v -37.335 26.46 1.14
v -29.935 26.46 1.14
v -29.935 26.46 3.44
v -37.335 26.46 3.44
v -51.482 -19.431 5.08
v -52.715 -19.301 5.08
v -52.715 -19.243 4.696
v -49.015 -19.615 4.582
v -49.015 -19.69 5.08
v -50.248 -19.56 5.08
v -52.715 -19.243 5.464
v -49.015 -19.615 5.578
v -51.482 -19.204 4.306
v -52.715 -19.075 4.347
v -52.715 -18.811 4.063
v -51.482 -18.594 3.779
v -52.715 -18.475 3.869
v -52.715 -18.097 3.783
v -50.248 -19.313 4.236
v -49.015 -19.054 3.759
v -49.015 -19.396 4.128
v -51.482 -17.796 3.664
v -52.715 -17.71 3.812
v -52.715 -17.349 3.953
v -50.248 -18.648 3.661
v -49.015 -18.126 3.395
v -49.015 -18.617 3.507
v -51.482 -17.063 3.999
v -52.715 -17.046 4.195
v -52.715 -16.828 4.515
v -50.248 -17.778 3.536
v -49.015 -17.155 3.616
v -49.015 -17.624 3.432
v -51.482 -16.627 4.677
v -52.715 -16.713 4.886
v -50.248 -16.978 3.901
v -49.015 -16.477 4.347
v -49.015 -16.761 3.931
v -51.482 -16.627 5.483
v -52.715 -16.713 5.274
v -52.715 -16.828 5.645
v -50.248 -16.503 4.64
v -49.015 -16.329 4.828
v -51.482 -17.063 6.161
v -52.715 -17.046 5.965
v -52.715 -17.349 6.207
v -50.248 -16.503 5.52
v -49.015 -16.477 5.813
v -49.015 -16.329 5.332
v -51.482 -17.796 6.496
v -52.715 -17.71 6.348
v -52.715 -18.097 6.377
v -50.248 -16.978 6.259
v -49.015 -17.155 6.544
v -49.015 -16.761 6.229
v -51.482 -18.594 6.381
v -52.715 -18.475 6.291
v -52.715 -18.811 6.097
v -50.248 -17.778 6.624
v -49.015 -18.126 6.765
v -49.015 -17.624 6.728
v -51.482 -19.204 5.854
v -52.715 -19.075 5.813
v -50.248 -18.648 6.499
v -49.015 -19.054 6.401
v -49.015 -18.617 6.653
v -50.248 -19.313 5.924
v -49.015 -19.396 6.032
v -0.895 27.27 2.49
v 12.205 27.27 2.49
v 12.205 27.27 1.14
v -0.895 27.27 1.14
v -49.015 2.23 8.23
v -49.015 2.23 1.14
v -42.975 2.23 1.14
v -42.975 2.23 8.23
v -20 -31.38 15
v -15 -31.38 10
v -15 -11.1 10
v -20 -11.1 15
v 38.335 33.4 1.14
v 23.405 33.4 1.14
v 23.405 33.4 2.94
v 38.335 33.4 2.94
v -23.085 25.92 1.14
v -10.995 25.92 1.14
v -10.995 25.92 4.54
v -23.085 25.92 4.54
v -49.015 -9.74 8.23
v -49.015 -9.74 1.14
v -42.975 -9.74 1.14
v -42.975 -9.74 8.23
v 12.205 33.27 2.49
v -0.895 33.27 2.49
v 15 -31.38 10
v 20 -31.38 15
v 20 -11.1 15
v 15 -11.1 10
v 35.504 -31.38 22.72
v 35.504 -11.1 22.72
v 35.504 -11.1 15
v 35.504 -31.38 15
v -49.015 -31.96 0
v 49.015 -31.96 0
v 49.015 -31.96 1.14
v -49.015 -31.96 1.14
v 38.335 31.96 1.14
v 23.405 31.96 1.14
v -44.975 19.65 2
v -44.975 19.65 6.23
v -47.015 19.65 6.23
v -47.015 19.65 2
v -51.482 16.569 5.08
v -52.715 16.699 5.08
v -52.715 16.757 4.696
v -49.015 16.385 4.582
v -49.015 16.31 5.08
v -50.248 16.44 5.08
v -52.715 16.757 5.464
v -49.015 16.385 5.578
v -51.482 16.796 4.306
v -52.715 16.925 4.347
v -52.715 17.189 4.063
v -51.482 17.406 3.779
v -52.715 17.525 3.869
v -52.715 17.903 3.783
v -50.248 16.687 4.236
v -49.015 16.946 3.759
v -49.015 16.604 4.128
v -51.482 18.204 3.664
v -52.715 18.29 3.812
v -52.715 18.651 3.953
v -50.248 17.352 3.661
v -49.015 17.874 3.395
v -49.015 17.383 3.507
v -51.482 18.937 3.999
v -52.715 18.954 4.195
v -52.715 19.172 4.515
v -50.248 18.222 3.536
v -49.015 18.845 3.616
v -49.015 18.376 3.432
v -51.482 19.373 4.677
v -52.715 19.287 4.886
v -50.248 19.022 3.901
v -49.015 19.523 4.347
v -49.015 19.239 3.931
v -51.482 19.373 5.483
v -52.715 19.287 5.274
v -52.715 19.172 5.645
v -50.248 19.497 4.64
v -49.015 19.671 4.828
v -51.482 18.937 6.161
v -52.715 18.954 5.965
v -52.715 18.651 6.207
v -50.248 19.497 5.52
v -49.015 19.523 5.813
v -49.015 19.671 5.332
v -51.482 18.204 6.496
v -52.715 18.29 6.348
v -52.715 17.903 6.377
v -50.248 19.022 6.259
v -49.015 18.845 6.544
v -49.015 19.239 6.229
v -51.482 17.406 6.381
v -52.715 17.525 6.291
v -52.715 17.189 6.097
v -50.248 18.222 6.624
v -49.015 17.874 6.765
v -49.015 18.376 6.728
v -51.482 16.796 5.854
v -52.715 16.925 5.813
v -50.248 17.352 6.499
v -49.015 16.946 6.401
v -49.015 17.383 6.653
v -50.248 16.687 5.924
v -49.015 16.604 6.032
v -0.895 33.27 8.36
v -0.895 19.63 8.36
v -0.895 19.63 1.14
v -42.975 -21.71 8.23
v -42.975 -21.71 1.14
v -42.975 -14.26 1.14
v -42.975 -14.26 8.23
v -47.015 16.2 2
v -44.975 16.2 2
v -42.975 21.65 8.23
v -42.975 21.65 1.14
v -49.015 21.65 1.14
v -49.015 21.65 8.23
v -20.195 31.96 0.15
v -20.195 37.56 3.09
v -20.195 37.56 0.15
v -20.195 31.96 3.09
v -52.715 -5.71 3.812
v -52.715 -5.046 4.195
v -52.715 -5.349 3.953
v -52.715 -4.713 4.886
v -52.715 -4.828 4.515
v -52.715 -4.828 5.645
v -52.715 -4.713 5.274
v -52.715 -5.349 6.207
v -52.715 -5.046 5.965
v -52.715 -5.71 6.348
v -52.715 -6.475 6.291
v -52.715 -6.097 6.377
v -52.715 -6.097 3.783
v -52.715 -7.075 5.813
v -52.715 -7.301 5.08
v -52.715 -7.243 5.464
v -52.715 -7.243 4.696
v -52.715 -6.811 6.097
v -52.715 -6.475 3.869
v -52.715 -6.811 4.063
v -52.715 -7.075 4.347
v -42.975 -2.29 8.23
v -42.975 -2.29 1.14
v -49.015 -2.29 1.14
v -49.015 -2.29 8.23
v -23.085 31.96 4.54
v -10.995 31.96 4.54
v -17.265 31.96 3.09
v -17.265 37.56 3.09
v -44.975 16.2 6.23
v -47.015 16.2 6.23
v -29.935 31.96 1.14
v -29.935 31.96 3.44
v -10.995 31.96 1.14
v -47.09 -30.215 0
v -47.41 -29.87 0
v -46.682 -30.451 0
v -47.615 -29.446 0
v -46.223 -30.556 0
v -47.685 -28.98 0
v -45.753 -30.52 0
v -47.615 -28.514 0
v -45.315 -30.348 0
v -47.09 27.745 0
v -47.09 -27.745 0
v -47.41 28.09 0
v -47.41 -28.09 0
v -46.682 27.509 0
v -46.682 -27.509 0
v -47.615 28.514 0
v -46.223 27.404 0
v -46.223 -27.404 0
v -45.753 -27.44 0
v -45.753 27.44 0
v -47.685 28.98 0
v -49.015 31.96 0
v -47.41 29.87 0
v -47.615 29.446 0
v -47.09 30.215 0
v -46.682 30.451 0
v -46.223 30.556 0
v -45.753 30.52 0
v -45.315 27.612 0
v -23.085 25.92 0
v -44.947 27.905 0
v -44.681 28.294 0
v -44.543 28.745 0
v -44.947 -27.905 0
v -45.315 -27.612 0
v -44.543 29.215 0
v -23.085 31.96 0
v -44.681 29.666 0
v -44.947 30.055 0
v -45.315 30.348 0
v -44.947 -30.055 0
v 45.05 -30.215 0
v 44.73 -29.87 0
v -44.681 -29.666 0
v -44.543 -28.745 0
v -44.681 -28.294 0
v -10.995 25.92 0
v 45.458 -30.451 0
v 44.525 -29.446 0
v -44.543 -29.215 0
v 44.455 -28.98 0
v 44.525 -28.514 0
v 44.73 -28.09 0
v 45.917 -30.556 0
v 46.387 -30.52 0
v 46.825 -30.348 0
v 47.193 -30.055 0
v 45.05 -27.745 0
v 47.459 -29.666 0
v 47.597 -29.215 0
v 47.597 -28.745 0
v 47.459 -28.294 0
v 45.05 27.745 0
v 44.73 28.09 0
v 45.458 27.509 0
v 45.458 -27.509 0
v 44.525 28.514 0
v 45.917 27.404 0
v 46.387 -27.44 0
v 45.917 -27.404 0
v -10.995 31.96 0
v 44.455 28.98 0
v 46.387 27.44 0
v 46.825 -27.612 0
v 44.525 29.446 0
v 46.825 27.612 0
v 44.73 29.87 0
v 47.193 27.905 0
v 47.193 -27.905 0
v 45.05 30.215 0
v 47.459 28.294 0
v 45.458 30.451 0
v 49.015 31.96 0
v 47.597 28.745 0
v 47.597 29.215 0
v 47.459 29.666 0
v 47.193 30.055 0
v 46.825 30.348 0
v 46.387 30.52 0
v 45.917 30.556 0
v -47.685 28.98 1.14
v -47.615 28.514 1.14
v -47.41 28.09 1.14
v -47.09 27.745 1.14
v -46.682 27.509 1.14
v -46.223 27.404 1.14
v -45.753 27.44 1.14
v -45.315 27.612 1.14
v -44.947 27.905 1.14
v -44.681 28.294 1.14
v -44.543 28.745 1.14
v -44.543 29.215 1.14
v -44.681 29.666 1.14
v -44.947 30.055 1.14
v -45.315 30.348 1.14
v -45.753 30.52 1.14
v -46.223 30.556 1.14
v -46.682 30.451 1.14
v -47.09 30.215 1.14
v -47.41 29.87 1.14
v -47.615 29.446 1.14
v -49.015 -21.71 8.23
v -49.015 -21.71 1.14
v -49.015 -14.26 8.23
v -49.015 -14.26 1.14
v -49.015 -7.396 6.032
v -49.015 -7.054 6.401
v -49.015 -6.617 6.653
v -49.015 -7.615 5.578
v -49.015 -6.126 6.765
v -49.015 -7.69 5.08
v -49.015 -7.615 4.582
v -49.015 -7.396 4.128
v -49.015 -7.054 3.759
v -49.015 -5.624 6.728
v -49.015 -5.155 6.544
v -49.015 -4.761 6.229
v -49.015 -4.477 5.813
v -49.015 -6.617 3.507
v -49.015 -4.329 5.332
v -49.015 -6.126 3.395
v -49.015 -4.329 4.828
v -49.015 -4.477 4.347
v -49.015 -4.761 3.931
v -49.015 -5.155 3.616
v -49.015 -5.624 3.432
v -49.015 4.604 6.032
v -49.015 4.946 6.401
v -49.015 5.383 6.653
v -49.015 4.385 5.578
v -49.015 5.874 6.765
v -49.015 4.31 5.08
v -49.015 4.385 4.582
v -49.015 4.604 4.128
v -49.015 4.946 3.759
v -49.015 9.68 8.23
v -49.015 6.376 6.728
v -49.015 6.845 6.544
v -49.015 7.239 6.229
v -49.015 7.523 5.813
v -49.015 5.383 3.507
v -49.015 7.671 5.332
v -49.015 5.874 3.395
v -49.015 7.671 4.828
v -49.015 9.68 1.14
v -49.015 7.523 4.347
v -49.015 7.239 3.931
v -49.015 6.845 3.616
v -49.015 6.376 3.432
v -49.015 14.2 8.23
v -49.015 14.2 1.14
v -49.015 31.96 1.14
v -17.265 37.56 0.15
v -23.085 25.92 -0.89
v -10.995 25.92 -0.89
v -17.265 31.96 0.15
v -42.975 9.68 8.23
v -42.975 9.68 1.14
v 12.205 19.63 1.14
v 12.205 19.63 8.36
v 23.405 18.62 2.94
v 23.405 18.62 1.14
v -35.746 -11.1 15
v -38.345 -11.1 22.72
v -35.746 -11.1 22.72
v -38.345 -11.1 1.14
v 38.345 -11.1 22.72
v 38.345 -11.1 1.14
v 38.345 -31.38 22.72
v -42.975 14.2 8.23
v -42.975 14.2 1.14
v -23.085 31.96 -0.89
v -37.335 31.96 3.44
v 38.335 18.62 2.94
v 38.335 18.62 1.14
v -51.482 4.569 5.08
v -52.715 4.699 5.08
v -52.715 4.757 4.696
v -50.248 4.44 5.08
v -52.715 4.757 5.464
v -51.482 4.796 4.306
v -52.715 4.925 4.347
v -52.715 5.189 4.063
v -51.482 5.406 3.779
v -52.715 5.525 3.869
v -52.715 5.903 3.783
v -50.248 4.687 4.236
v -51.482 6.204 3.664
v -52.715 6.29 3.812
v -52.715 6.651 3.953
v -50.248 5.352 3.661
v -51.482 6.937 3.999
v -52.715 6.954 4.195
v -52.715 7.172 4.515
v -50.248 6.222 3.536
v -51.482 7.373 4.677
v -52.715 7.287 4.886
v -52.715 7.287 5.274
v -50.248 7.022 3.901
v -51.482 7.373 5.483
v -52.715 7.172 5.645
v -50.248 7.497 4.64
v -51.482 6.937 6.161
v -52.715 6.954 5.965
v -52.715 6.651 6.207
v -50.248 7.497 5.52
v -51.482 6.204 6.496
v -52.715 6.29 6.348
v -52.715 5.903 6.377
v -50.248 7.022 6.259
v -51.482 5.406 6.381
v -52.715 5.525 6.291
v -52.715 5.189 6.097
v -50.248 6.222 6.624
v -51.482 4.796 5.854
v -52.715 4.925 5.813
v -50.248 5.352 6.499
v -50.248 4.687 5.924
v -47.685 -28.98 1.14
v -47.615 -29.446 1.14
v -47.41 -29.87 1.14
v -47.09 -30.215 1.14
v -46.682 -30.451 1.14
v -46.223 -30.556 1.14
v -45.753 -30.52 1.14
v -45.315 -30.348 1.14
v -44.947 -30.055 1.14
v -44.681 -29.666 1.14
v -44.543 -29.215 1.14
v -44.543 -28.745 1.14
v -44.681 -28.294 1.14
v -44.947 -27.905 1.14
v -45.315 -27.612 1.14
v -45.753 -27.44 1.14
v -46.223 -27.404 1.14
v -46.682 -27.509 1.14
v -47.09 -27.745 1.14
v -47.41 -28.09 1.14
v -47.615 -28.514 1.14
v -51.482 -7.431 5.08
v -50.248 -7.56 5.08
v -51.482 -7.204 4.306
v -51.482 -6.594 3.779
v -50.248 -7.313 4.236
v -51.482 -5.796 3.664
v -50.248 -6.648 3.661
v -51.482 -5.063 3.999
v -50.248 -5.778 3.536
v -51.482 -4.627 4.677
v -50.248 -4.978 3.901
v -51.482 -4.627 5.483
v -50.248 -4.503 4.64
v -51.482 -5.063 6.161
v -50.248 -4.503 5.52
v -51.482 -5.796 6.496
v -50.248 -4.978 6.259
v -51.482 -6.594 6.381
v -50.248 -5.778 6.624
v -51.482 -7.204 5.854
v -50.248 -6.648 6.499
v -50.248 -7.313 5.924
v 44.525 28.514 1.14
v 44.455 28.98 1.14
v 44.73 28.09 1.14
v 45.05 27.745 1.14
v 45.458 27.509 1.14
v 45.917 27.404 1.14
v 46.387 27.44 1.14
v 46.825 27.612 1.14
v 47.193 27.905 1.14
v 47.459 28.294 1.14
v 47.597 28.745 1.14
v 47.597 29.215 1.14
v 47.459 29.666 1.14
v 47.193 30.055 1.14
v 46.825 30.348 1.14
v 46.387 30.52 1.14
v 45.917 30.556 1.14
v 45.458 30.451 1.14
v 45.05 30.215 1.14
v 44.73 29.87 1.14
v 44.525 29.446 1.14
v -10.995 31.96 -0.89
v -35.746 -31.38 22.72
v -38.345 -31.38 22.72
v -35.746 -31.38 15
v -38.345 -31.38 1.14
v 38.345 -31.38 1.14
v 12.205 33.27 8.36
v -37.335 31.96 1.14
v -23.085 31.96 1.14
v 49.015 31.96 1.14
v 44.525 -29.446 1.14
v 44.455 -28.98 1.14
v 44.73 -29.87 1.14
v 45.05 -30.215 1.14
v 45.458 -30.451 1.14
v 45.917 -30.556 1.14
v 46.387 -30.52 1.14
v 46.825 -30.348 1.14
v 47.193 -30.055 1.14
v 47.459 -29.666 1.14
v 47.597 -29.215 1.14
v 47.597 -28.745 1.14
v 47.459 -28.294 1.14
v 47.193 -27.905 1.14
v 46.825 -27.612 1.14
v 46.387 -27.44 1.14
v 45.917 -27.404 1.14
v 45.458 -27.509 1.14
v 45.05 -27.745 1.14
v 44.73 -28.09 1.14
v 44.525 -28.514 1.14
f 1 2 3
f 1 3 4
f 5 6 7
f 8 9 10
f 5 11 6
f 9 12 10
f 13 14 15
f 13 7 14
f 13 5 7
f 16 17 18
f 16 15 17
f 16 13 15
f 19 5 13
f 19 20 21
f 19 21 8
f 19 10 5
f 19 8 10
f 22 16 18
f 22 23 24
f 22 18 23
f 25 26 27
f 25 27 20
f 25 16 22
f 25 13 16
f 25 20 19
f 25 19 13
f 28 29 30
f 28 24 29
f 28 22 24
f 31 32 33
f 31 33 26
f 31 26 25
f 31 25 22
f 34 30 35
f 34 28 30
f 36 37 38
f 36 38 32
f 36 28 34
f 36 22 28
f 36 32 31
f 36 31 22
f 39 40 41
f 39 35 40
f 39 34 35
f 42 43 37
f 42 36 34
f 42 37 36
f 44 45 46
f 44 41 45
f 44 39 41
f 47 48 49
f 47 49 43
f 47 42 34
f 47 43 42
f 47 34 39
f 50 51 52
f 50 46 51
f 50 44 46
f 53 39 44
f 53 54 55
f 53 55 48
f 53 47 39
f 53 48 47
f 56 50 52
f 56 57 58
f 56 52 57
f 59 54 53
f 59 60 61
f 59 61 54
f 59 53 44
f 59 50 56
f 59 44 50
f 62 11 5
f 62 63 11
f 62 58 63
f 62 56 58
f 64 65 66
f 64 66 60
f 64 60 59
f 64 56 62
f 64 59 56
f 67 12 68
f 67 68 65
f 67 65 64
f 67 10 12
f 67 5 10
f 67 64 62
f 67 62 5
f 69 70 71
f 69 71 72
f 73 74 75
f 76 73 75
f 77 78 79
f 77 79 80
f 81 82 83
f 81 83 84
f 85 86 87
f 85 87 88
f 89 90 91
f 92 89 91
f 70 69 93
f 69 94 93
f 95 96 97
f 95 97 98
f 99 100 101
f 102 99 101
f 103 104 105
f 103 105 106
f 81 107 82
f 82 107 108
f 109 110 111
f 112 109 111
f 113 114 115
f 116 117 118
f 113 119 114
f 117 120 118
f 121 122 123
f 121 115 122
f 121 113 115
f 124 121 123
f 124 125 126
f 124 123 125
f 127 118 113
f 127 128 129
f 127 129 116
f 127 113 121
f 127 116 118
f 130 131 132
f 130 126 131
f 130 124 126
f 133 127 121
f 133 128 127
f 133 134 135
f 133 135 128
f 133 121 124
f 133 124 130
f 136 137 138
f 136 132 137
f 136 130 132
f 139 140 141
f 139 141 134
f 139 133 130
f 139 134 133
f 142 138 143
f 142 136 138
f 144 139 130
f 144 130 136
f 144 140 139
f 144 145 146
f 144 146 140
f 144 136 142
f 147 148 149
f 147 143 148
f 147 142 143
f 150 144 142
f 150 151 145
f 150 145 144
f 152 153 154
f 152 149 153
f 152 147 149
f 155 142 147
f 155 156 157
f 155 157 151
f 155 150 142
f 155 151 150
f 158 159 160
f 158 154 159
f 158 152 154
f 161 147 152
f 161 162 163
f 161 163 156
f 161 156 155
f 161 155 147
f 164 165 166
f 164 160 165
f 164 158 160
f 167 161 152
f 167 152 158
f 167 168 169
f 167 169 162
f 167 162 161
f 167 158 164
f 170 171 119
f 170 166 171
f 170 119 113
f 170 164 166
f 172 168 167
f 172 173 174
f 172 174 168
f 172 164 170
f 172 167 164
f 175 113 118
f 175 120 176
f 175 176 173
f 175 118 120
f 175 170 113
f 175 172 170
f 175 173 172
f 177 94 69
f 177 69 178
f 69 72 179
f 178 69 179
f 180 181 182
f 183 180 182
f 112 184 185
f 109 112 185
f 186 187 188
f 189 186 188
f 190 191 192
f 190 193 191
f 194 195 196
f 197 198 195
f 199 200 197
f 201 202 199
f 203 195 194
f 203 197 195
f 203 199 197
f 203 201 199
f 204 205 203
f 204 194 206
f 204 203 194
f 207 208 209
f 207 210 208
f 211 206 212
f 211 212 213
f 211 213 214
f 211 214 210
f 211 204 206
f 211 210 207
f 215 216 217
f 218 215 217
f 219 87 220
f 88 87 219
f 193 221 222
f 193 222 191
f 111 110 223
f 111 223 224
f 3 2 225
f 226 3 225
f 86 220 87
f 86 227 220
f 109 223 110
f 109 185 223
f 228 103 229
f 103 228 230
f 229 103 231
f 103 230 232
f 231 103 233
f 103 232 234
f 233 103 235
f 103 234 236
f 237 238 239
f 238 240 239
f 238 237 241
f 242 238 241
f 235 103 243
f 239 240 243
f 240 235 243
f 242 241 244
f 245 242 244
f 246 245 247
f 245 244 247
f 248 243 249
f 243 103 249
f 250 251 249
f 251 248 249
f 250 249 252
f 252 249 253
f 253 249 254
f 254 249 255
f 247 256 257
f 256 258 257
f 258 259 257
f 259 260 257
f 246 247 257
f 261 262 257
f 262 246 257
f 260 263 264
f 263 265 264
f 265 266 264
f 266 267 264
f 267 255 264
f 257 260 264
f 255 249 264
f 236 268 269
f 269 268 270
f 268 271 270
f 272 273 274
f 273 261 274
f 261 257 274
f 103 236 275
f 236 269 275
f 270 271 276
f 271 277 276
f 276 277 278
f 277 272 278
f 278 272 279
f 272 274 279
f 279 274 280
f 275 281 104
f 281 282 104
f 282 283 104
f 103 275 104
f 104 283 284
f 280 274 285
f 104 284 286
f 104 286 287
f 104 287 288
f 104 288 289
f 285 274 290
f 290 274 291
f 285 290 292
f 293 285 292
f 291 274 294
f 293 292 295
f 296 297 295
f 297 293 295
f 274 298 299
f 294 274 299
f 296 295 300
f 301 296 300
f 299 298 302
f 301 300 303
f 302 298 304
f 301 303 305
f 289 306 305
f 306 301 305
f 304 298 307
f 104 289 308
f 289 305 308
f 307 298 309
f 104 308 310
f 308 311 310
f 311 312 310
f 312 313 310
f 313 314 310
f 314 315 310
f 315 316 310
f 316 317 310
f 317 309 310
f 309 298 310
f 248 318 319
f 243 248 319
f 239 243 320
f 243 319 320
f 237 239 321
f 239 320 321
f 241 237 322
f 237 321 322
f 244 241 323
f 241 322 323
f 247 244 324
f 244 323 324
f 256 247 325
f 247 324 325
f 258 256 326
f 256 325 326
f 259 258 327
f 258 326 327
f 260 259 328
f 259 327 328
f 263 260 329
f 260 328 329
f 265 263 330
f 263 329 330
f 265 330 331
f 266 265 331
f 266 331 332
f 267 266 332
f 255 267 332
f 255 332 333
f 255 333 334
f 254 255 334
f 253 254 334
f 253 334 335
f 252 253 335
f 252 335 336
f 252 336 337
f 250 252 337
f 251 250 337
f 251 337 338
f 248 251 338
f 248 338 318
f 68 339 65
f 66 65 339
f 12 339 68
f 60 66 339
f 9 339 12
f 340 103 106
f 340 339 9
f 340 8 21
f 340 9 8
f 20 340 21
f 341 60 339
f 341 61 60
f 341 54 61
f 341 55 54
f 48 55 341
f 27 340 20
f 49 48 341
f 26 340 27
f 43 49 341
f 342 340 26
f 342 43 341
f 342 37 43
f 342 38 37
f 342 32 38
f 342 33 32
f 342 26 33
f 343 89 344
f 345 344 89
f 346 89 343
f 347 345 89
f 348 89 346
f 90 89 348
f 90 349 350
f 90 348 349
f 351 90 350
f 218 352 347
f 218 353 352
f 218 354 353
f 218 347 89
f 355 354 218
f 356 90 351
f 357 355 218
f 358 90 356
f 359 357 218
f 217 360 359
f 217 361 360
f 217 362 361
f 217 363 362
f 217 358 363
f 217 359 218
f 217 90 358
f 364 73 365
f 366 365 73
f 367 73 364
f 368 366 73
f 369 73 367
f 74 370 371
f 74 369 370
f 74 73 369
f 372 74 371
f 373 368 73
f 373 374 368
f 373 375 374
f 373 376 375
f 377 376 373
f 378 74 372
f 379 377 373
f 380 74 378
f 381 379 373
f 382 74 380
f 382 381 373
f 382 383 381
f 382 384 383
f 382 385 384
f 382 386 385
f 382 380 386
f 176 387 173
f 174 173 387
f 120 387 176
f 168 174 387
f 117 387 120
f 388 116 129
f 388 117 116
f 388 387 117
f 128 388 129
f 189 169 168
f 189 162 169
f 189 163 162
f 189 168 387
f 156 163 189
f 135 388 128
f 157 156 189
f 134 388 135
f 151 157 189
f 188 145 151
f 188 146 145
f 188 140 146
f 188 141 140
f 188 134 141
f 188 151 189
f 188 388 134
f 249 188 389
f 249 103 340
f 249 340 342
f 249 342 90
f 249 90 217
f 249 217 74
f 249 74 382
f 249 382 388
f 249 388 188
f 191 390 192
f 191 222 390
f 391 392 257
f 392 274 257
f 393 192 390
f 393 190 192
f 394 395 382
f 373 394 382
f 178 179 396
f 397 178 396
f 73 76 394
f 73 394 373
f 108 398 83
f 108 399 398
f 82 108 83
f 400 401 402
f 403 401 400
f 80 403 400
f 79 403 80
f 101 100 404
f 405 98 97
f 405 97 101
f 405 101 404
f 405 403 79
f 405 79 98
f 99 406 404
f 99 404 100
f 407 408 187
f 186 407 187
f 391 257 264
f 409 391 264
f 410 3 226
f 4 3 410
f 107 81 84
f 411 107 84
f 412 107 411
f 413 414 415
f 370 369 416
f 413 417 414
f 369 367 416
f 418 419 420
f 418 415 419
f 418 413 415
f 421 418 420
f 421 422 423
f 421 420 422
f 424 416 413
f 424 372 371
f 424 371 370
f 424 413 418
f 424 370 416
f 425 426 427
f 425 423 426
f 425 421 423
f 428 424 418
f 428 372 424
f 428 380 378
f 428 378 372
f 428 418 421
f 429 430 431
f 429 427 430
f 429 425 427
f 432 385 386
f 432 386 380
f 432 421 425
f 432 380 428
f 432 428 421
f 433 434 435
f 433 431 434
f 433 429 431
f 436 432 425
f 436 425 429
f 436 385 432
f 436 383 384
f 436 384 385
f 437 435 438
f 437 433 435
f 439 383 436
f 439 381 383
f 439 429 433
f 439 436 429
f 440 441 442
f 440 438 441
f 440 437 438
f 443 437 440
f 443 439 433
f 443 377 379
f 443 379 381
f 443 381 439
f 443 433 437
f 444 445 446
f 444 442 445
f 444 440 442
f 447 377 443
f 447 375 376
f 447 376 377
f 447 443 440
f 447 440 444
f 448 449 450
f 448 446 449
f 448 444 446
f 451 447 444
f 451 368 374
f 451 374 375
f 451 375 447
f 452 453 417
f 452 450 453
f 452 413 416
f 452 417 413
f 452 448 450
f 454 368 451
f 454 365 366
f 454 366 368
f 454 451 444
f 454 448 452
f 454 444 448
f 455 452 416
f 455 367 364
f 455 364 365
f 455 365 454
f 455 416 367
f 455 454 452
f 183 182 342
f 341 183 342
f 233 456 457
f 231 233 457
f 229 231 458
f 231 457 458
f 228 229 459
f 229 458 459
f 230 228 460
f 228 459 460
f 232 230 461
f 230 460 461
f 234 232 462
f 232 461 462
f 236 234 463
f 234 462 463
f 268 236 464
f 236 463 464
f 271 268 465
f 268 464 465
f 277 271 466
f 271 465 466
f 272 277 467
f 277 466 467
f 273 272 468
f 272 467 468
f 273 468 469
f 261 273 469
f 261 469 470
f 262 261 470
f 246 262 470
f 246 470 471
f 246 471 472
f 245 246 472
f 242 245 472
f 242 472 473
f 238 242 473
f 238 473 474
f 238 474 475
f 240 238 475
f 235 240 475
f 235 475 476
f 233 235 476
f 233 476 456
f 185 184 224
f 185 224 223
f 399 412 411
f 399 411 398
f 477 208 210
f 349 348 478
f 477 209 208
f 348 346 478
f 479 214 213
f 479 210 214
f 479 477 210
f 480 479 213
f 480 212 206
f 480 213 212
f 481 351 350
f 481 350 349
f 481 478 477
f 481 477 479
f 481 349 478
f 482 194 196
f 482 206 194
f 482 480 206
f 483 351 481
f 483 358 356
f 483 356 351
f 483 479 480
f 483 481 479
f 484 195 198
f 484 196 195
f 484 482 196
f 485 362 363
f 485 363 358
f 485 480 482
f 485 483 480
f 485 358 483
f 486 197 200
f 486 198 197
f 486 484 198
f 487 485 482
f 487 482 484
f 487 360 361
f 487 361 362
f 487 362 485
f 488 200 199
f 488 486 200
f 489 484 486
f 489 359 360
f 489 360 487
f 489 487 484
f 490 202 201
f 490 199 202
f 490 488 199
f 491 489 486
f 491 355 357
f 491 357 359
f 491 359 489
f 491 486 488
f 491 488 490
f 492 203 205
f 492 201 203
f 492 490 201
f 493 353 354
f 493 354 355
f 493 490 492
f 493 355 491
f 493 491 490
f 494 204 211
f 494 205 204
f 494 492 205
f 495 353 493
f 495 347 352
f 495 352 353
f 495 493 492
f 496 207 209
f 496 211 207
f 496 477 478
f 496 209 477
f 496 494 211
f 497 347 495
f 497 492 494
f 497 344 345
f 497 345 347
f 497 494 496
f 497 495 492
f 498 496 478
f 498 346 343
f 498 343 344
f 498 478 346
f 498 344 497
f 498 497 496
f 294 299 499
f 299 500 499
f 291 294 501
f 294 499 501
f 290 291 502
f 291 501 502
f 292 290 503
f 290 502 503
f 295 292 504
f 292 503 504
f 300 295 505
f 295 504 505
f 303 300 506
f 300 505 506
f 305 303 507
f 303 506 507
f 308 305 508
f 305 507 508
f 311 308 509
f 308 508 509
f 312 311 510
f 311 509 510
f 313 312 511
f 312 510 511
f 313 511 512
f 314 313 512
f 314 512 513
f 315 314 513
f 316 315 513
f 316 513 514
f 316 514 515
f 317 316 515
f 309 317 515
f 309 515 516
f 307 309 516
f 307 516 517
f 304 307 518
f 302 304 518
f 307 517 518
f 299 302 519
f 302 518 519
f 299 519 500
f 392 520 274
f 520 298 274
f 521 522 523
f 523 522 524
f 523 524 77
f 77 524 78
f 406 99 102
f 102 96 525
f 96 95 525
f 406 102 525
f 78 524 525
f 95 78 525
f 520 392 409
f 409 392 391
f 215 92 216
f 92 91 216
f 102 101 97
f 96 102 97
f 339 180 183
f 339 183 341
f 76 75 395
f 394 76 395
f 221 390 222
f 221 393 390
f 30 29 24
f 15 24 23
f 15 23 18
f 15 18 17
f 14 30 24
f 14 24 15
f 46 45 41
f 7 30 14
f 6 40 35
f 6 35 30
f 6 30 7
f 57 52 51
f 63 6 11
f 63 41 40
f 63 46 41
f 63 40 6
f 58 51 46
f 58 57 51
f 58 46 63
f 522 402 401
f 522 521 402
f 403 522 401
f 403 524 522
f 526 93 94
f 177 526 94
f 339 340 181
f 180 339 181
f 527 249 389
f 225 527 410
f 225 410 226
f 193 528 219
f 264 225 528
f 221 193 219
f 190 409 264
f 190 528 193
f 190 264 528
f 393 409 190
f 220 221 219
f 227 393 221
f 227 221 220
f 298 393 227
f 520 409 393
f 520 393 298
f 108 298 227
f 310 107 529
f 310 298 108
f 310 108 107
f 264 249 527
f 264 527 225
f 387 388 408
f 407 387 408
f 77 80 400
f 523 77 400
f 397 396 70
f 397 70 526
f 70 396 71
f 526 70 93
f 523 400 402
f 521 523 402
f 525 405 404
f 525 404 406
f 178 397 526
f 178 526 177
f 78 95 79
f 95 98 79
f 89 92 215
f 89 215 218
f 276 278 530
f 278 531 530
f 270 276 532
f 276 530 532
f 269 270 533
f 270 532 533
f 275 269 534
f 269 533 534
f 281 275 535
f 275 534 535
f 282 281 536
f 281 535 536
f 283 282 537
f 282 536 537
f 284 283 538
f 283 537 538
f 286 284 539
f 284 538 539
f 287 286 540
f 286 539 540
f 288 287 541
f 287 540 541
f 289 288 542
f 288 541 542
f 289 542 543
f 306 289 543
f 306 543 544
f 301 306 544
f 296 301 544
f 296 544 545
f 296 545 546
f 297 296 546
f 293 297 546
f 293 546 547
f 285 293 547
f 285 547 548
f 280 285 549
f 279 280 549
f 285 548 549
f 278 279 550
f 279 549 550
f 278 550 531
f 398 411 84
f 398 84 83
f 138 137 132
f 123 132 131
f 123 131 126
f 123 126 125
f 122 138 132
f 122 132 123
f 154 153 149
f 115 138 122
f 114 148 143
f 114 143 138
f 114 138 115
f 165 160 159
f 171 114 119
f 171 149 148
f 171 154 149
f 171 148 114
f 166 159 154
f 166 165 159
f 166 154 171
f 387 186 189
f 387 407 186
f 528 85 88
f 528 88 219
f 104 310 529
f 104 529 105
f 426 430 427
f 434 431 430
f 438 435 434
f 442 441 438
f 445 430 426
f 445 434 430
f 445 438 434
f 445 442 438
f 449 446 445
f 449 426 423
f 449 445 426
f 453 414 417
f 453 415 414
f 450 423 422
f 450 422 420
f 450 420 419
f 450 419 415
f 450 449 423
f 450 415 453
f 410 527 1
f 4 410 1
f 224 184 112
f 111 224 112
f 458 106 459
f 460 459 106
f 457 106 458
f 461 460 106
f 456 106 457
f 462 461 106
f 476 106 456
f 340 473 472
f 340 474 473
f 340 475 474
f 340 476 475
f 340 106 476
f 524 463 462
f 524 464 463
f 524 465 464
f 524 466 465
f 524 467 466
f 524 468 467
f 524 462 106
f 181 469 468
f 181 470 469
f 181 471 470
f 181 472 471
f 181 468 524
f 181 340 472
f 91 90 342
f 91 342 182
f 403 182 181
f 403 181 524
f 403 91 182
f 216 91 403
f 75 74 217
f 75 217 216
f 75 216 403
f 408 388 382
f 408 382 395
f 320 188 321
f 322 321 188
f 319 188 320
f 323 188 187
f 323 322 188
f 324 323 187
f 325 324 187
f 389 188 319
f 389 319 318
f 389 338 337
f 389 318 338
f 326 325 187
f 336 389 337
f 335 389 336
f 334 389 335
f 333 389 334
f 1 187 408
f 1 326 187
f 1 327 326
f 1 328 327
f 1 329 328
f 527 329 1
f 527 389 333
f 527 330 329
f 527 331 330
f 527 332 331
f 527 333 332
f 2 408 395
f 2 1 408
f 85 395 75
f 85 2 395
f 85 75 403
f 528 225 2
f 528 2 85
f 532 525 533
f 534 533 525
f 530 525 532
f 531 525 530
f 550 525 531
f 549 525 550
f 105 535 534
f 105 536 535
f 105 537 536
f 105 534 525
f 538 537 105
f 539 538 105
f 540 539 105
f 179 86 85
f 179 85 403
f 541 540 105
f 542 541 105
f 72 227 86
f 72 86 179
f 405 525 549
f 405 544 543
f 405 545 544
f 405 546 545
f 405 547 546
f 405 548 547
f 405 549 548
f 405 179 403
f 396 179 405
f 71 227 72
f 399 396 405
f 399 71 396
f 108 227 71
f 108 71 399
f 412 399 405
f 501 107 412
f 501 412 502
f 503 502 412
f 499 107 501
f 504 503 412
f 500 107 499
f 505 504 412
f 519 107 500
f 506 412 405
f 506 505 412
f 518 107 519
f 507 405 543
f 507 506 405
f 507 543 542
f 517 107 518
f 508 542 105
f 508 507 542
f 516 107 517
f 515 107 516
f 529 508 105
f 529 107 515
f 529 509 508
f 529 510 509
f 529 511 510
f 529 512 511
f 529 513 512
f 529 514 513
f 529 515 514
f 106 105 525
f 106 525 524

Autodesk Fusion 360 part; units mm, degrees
sketch "Sketch1" plane through (0, 0, 0) normal (0, 0, 1) x (1, 0, 0)
sketch "Sketch2" plane through (0, 0, 0) normal (0, 0, 1) x (1, 0, 0)
  line L0 (49.015, -31.96) -> (-49.015, -31.96)
  line L1 (-49.015, -31.96) -> (-49.015, 31.96)
  line L2 (-49.015, 31.96) -> (49.015, 31.96)
  line L3 (49.015, 31.96) -> (49.015, -31.96)
  line L4 (49.015, -31.96) -> (-49.015, 31.96) construction
  line L5 (-49.015, -31.96) -> (49.015, 31.96) construction
  dimension "d1" = 98.03
  dimension "d2" = 63.92
extrude "Extrude1" add sketch "Sketch2" along normal blind 1.14
sketch "Sketch3" plane through (0, 0, 1.14) normal (0, 0, 1) x (-1, 0, 0)
  line L0 (-49.015, -31.96) -> (49.015, -31.96)
  line L1 (49.015, -31.96) -> (49.015, 31.96)
  line L2 (49.015, 31.96) -> (-49.015, 31.96)
  line L3 (-49.015, 31.96) -> (-49.015, -31.96)
  line L4 (-49.015, 31.96) -> (-38.345, 31.96) construction
  line L5 (49.015, 31.96) -> (38.345, 31.96) construction
  line L6 (38.345, 31.38) -> (38.345, 11.1)
  line L7 (38.345, 11.1) -> (-38.345, 11.1)
  line L8 (-38.345, 11.1) -> (-38.345, 31.38)
  line L9 (38.345, 31.96) -> (-38.345, 31.96)
  circle A0 centre (46.105, -28.98) radius 1.58
  circle A1 centre (46.105, 28.98) radius 1.58
  circle A2 centre (-46.035, -28.98) radius 1.58
  circle A3 centre (-46.035, 28.98) radius 1.58
  line L10 (38.345, 31.38) -> (-38.345, 31.38)
  dimension "d5" = 10.67
  dimension "d6" = 10.67
  dimension "d7" = 2.91
  dimension "d8" = 2.98
  dimension "d9" = 3.16
  dimension "d12" = 3.16
  dimension "d13" = 3.16
  dimension "d14" = 3.16
  dimension "d15" = 2.98
  dimension "d16" = 2.98
  dimension "d17" = 2.98
  dimension "d18" = 2.98
  dimension "d19" = 2.91
  dimension "d20" = 2.98
  dimension "d38" = 20.86
  dimension "d39" = 0.58
extrude "Extrude2" add sketch "Sketch3" along normal blind 21.58 contours L6 L7 L8 L10 | A0 | A1 | A2 | A3
sketch "Sketch5" plane through (0, 0, 1.14) normal (0, 0, 1) x (-1, 0, 0)
  circle A0 centre (46.105, 28.98) radius 1.58
  circle A1 centre (-46.035, -28.98) radius 1.58
  circle A2 centre (46.105, -28.98) radius 1.58
  circle A3 centre (-46.035, 28.98) radius 1.58
  line L0 (-49.015, -31.96) -> (49.015, -31.96)
  line L1 (49.015, -31.96) -> (49.015, 31.96)
  line L2 (49.015, 31.96) -> (-49.015, 31.96)
  line L3 (-49.015, 31.96) -> (-49.015, -31.96)
  line L4 (49.015, 31.96) -> (49.015, 21.71) construction
  line L5 (49.015, 21.71) -> (42.975, 21.71)
  line L6 (42.975, 21.71) -> (42.975, 14.26)
  line L7 (42.975, 14.26) -> (49.015, 14.26)
  line L8 (43.7525, 14.26) -> (43.7525, 9.51) construction
  line L9 (49.015, 9.74) -> (42.975, 9.74)
  line L10 (42.975, 9.74) -> (42.975, 2.29)
  line L11 (42.975, 2.29) -> (49.015, 2.29)
  line L12 (49.015, 2.29) -> (49.015, 9.74)
  line L13 (49.015, 9.74) -> (42.975, 9.74)
  line L14 (43.8683, 2.29) -> (43.8683, -2.46) construction
  line L15 (49.015, -2.23) -> (42.975, -2.23)
  line L16 (42.975, -2.23) -> (42.975, -9.68)
  line L17 (42.975, -9.68) -> (49.015, -9.68)
  line L18 (43.9024, -9.68) -> (43.9024, -14.43) construction
  line L19 (49.015, -14.2) -> (42.975, -14.2)
  line L20 (42.975, -14.2) -> (42.975, -21.65)
  line L21 (42.975, -21.65) -> (49.015, -21.65)
  line L22 (38.345, 11.1) -> (-38.345, 11.1)
  line L23 (-38.345, 11.1) -> (-38.345, 31.38)
  line L24 (-38.345, 31.38) -> (38.345, 31.38)
  line L25 (38.345, 31.38) -> (38.345, 11.1)
  dimension "d21" = 10.25
  dimension "d22" = 6.04
  dimension "d23" = 7.45
  dimension "d24" = 4.75
  dimension "d25" = 7.45
  dimension "d26" = 4.75
  dimension "d27" = 6.04
  dimension "d28" = 7.45
  dimension "d29" = 4.75
  dimension "d30" = 6.04
  dimension "d31" = 7.45
  dimension "d32" = 6.04
  dimension "d33" = 4.52
  dimension "d34" = 4.52
  dimension "d35" = 4.52
extrude "Extrude3" add sketch "Sketch5" along normal blind 7.09 contours L1 L19 L20 L21 | L1 L5 L6 L7 | L1 L15 L16 L17 | L1 L9 L10 L11 L12 L13
extrude "Extrude4" cut 4 faces at (-45.3311, -29.4935, 22.72) (45.7717, -28.3669, 22.72) (45.7717, 29.5931, 22.72) (-45.3311, 28.4665, 22.72) along direction (0, 0, -1) blind 35
sketch "Sketch6" plane through (0, 0, 8.23) normal (0, 0, 1) x (-1, 0, 0)
  line L0 (42.975, 14.26) -> (49.015, 14.26)
  line L1 (49.015, 14.26) -> (49.015, 21.71)
  line L2 (49.015, 21.71) -> (42.975, 21.71)
  line L3 (42.975, 21.71) -> (42.975, 14.26)
  line L4 (49.015, 21.71) -> (46.905, 21.71) construction
  dimension "d42" = 2.11
shell "Shell1" thickness 2 removed faces 1 at (-12.7817, -17.86, 22.72)
sketch "Sketch7" plane through (0, -11.1, 0) normal (0, 1, 0) x (-1, 0, 0)
  line L0 (-38.345, 1.14) -> (38.345, 1.14)
  line L1 (38.345, 1.14) -> (38.345, 22.72)
  line L2 (38.345, 22.72) -> (-38.345, 22.72)
  line L3 (-38.345, 22.72) -> (-38.345, 1.14)
  line L4 (-35.5042, 22.72) -> (-35.5042, 15)
  line L5 (-35.5042, 15) -> (-20, 15)
  line L6 (-20, 15) -> (-15, 10)
  line L7 (-15, 10) -> (15, 10)
  line L8 (15, 10) -> (20, 15)
  line L9 (20, 15) -> (25, 15)
  line L10 (25, 15) -> (35.7465, 15)
  line L11 (35.7465, 15) -> (35.7465, 22.72)
extrude "Extrude5" cut sketch "Sketch7" against normal blind 30 contours L2 L4 L5 L6 L7 L8 L9 L10 L11
sketch "Sketch8" plane through (0, -11.1, 0) normal (0, 1, 0) x (-1, 0, 0)
sketch "Sketch9" plane through (0, 0, 1.14) normal (0, 0, 1) x (-1, 0, 0)
  line L0 (42.975, -14.2) -> (49.015, -14.2)
  line L1 (49.015, -14.2) -> (49.015, -9.68)
  line L2 (49.015, -9.68) -> (42.975, -9.68)
  line L3 (42.975, -9.68) -> (42.975, -2.23)
  line L4 (42.975, -2.23) -> (49.015, -2.23)
  line L5 (49.015, -2.23) -> (49.015, 2.29)
  line L6 (49.015, 2.29) -> (42.975, 2.29)
  line L7 (42.975, 2.29) -> (42.975, 9.74)
  line L8 (42.975, 9.74) -> (49.015, 9.74)
  line L9 (49.015, 9.74) -> (49.015, 14.26)
  line L10 (49.015, 14.26) -> (42.975, 14.26)
  line L11 (42.975, 14.26) -> (42.975, 21.71)
  line L12 (42.975, 21.71) -> (49.015, 21.71)
  line L13 (49.015, 21.71) -> (49.015, 31.96)
  line L14 (49.015, 31.96) -> (-49.015, 31.96)
  line L15 (-49.015, 31.96) -> (-49.015, -31.96)
  line L16 (-49.015, -31.96) -> (49.015, -31.96)
  line L17 (49.015, -31.96) -> (49.015, -21.65)
  line L18 (49.015, -21.65) -> (42.975, -21.65)
  line L19 (42.975, -21.65) -> (42.975, -14.2)
  circle A0 centre (-46.035, -28.98) radius 1.58
  circle A1 centre (46.105, 28.98) radius 1.58
  circle A2 centre (-46.035, 28.98) radius 1.58
  circle A3 centre (46.105, -28.98) radius 1.58
  line L20 (38.345, 11.1) -> (-38.345, 11.1)
  line L21 (-38.345, 11.1) -> (-38.345, 31.38)
  line L22 (-38.345, 31.38) -> (38.345, 31.38)
  line L23 (38.345, 31.38) -> (38.345, 11.1)
  line L24 (-49.015, -31.96) -> (-38.335, -31.96) construction
  line L25 (-38.335, -31.96) -> (-38.335, -18.62)
  line L26 (-38.335, -18.62) -> (-23.405, -18.62)
  line L27 (-23.405, -18.62) -> (-23.405, -33.4)
  line L28 (-23.405, -33.4) -> (-38.335, -33.4)
  line L29 (-38.335, -33.4) -> (-38.335, -31.96)
  dimension "d46" = 10.68
  dimension "d47" = 13.34
  dimension "d48" = 14.93
  dimension "d49" = 14.78
extrude "Extrude6" add sketch "Sketch9" along normal blind 1.8 contours L16 L27 L28 L29 | L16 L25 L26 L27
sketch "Sketch10" plane through (0, 0, 1.14) normal (0, 0, 1) x (-1, 0, 0)
  line L0 (-23.405, -18.62) -> (-23.405, -31.96)
  line L1 (-23.405, -31.96) -> (49.015, -31.96)
  line L2 (49.015, -31.96) -> (49.015, -21.65)
  line L3 (49.015, -21.65) -> (42.975, -21.65)
  line L4 (42.975, -21.65) -> (42.975, -14.2)
  line L5 (42.975, -14.2) -> (49.015, -14.2)
  line L6 (49.015, -14.2) -> (49.015, -9.68)
  line L7 (49.015, -9.68) -> (42.975, -9.68)
  line L8 (42.975, -9.68) -> (42.975, -2.23)
  line L9 (42.975, -2.23) -> (49.015, -2.23)
  line L10 (49.015, -2.23) -> (49.015, 2.29)
  line L11 (49.015, 2.29) -> (42.975, 2.29)
  line L12 (42.975, 2.29) -> (42.975, 9.74)
  line L13 (42.975, 9.74) -> (49.015, 9.74)
  line L14 (49.015, 9.74) -> (49.015, 14.26)
  line L15 (49.015, 14.26) -> (42.975, 14.26)
  line L16 (42.975, 14.26) -> (42.975, 21.71)
  line L17 (42.975, 21.71) -> (49.015, 21.71)
  line L18 (49.015, 21.71) -> (49.015, 31.96)
  line L19 (49.015, 31.96) -> (-49.015, 31.96)
  line L20 (-49.015, 31.96) -> (-49.015, -31.96)
  line L21 (-49.015, -31.96) -> (-38.335, -31.96)
  line L22 (-38.335, -31.96) -> (-38.335, -18.62)
  line L23 (-38.335, -18.62) -> (-23.405, -18.62)
  circle A0 centre (-46.035, -28.98) radius 1.58
  circle A1 centre (46.105, 28.98) radius 1.58
  circle A2 centre (-46.035, 28.98) radius 1.58
  circle A3 centre (46.105, -28.98) radius 1.58
  line L24 (38.345, 11.1) -> (-38.345, 11.1)
  line L25 (-38.345, 11.1) -> (-38.345, 31.38)
  line L26 (-38.345, 31.38) -> (38.345, 31.38)
  line L27 (38.345, 31.38) -> (38.345, 11.1)
  line L28 (-23.405, -27.6756) -> (-12.205, -27.6756) construction
  line L29 (-12.205, -31.96) -> (-12.205, -33.27)
  line L30 (-12.205, -33.27) -> (0.895, -33.27)
  line L31 (0.895, -33.27) -> (0.895, -19.63)
  line L32 (0.895, -19.63) -> (-12.205, -19.63)
  line L33 (-12.205, -19.63) -> (-12.205, -33.27)
  dimension "d52" = 11.2
  dimension "d53" = 1.31
  dimension "d54" = 13.1
  dimension "d55" = 13.64
extrude "Extrude7" add sketch "Sketch10" along normal blind 7.22 contours L1 L31 L32 L33 | L1 L29 L30 L31 L33
sketch "Sketch11" plane through (0, 33.27, 0) normal (0, 1, 0) x (-1, 0, 0)
  line L0 (-12.205, 1.14) -> (0.895, 1.14)
  line L1 (0.895, 1.14) -> (0.895, 8.36)
  line L2 (0.895, 8.36) -> (-12.205, 8.36)
  line L3 (-12.205, 8.36) -> (-12.205, 1.14)
  line L4 (0.895, 1.14) -> (0.895, 2.49) construction
  line L5 (0.895, 2.49) -> (-12.205, 2.49)
  dimension "d58" = 1.35
extrude "Extrude8" cut sketch "Sketch11" against normal blind 6 contours L0 L1 L3 L5
sketch "Sketch12" plane through (0, 0, 1.14) normal (0, 0, 1) x (-1, 0, 0)
  line L0 (-12.205, -27.27) -> (-12.205, -19.63)
  line L1 (-12.205, -19.63) -> (0.895, -19.63)
  line L2 (0.895, -19.63) -> (0.895, -27.27)
  line L3 (0.895, -27.27) -> (-12.205, -27.27)
  line L4 (-23.405, -31.96) -> (49.015, -31.96)
  line L5 (49.015, -31.96) -> (49.015, -21.65)
  line L6 (49.015, -21.65) -> (42.975, -21.65)
  line L7 (42.975, -21.65) -> (42.975, -14.2)
  line L8 (42.975, -14.2) -> (49.015, -14.2)
  line L9 (49.015, -14.2) -> (49.015, -9.68)
  line L10 (49.015, -9.68) -> (42.975, -9.68)
  line L11 (42.975, -9.68) -> (42.975, -2.23)
  line L12 (42.975, -2.23) -> (49.015, -2.23)
  line L13 (49.015, -2.23) -> (49.015, 2.29)
  line L14 (49.015, 2.29) -> (42.975, 2.29)
  line L15 (42.975, 2.29) -> (42.975, 9.74)
  line L16 (42.975, 9.74) -> (49.015, 9.74)
  line L17 (49.015, 9.74) -> (49.015, 14.26)
  line L18 (49.015, 14.26) -> (42.975, 14.26)
  line L19 (42.975, 14.26) -> (42.975, 21.71)
  line L20 (42.975, 21.71) -> (49.015, 21.71)
  line L21 (49.015, 21.71) -> (49.015, 31.96)
  line L22 (49.015, 31.96) -> (-49.015, 31.96)
  line L23 (-49.015, 31.96) -> (-49.015, -31.96)
  line L24 (-49.015, -31.96) -> (-38.335, -31.96)
  line L25 (-38.335, -31.96) -> (-38.335, -18.62)
  line L26 (-38.335, -18.62) -> (-23.405, -18.62)
  line L27 (-23.405, -18.62) -> (-23.405, -31.96)
  circle A0 centre (-46.035, -28.98) radius 1.58
  circle A1 centre (46.105, 28.98) radius 1.58
  circle A2 centre (-46.035, 28.98) radius 1.58
  circle A3 centre (46.105, -28.98) radius 1.58
  line L28 (38.345, 11.1) -> (-38.345, 11.1)
  line L29 (-38.345, 11.1) -> (-38.345, 31.38)
  line L30 (-38.345, 31.38) -> (38.345, 31.38)
  line L31 (38.345, 31.38) -> (38.345, 11.1)
  line L32 (0.895, -27.27) -> (10.995, -27.27) construction
  line L33 (10.995, -31.96) -> (10.995, -25.92)
  line L34 (10.995, -25.92) -> (23.085, -25.92)
  line L35 (23.085, -25.92) -> (23.085, -31.96)
  line L36 (23.085, -31.96) -> (10.995, -31.96)
  dimension "d61" = 10.1
  dimension "d62" = 6.04
  dimension "d63" = 12.09
extrude "Extrude9" add sketch "Sketch12" along normal blind 3.4 contours L4 L33 L34 L35 L36
extrude "Extrude10" add 1 faces at (-15.025, 27.9333, 4.54) along direction (0, 0, -1) blind 5.43
sketch "Sketch13" plane through (0, 31.96, 0) normal (0, 1, 0) x (-1, 0, 0)
  line L0 (10.995, 1.14) -> (-23.405, 1.14)
  line L1 (-23.405, 1.14) -> (-38.335, 1.14)
  line L2 (-38.335, 1.14) -> (-49.015, 1.14)
  line L3 (-49.015, 1.14) -> (-49.015, 0)
  line L4 (-49.015, 0) -> (10.995, 0)
  line L5 (10.995, 0) -> (10.995, -0.89)
  line L6 (10.995, -0.89) -> (23.085, -0.89)
  line L7 (23.085, -0.89) -> (23.085, 0)
  line L8 (23.085, 0) -> (49.015, 0)
  line L9 (49.015, 0) -> (49.015, 1.14)
  line L10 (49.015, 1.14) -> (23.085, 1.14)
  line L11 (23.085, 1.14) -> (23.085, 4.54)
  line L12 (23.085, 4.54) -> (10.995, 4.54)
  line L13 (10.995, 4.54) -> (10.995, 1.14)
  line L14 (17.265, 3.09) -> (20.195, 3.09)
  line L15 (20.195, 3.09) -> (20.195, 0.15)
  line L16 (20.195, 0.15) -> (17.265, 0.15)
  line L17 (17.265, 0.15) -> (17.265, 3.09)
  dimension "d68" = 2.93
  dimension "d69" = 2.94
  dimension "d70" = 1.45
  dimension "d71" = 2.89
extrude "Extrude11" add sketch "Sketch13" along normal blind 5.6 contours L14 L15 L16 L17
sketch "Sketch14" plane through (0, 0, 1.14) normal (0, 0, 1) x (-1, 0, 0)
  line L0 (38.345, 11.1) -> (-38.345, 11.1)
  line L1 (-38.345, 11.1) -> (-38.345, 31.38)
  line L2 (-38.345, 31.38) -> (38.345, 31.38)
  line L3 (38.345, 31.38) -> (38.345, 11.1)
  circle A0 centre (46.105, -28.98) radius 1.58
  circle A1 centre (-46.035, 28.98) radius 1.58
  circle A2 centre (46.105, 28.98) radius 1.58
  circle A3 centre (-46.035, -28.98) radius 1.58
  line L4 (10.995, -31.96) -> (10.995, -25.92)
  line L5 (10.995, -25.92) -> (23.085, -25.92)
  line L6 (23.085, -25.92) -> (23.085, -31.96)
  line L7 (23.085, -31.96) -> (49.015, -31.96)
  line L8 (49.015, -31.96) -> (49.015, -21.65)
  line L9 (49.015, -21.65) -> (42.975, -21.65)
  line L10 (42.975, -21.65) -> (42.975, -14.2)
  line L11 (42.975, -14.2) -> (49.015, -14.2)
  line L12 (49.015, -14.2) -> (49.015, -9.68)
  line L13 (49.015, -9.68) -> (42.975, -9.68)
  line L14 (42.975, -9.68) -> (42.975, -2.23)
  line L15 (42.975, -2.23) -> (49.015, -2.23)
  line L16 (49.015, -2.23) -> (49.015, 2.29)
  line L17 (49.015, 2.29) -> (42.975, 2.29)
  line L18 (42.975, 2.29) -> (42.975, 9.74)
  line L19 (42.975, 9.74) -> (49.015, 9.74)
  line L20 (49.015, 9.74) -> (49.015, 14.26)
  line L21 (49.015, 14.26) -> (42.975, 14.26)
  line L22 (42.975, 14.26) -> (42.975, 21.71)
  line L23 (42.975, 21.71) -> (49.015, 21.71)
  line L24 (49.015, 21.71) -> (49.015, 31.96)
  line L25 (49.015, 31.96) -> (-49.015, 31.96)
  line L26 (-49.015, 31.96) -> (-49.015, -31.96)
  line L27 (-49.015, -31.96) -> (-38.335, -31.96)
  line L28 (-38.335, -31.96) -> (-38.335, -18.62)
  line L29 (-38.335, -18.62) -> (-23.405, -18.62)
  line L30 (-23.405, -18.62) -> (-23.405, -31.96)
  line L31 (-23.405, -31.96) -> (10.995, -31.96)
  line L32 (-12.205, -27.27) -> (-12.205, -19.63)
  line L33 (-12.205, -19.63) -> (0.895, -19.63)
  line L34 (0.895, -19.63) -> (0.895, -27.27)
  line L35 (0.895, -27.27) -> (-12.205, -27.27)
  line L36 (23.085, -28.94) -> (29.935, -28.94) construction
  line L37 (29.935, -31.96) -> (37.335, -31.96)
  line L38 (37.335, -31.96) -> (37.335, -26.46)
  line L39 (29.935, -26.46) -> (37.335, -26.46)
  line L40 (29.935, -26.46) -> (29.935, -31.96)
  dimension "d74" = 6.85
  dimension "d75" = 7.4
  dimension "d76" = 5.5
extrude "Extrude12" add sketch "Sketch14" along normal blind 2.3 contours L7 L37 L38 L39 L40
sketch "Sketch15" plane through (0, 0, 1.14) normal (0, 0, 1) x (-1, 0, 0)
  line L0 (37.335, -26.46) -> (37.335, -31.96)
  line L1 (37.335, -31.96) -> (49.015, -31.96)
  line L2 (49.015, -31.96) -> (49.015, -21.65)
  line L3 (49.015, -21.65) -> (42.975, -21.65)
  line L4 (42.975, -21.65) -> (42.975, -14.2)
  line L5 (42.975, -14.2) -> (49.015, -14.2)
  line L6 (49.015, -14.2) -> (49.015, -9.68)
  line L7 (49.015, -9.68) -> (42.975, -9.68)
  line L8 (42.975, -9.68) -> (42.975, -2.23)
  line L9 (42.975, -2.23) -> (49.015, -2.23)
  line L10 (49.015, -2.23) -> (49.015, 2.29)
  line L11 (49.015, 2.29) -> (42.975, 2.29)
  line L12 (42.975, 2.29) -> (42.975, 9.74)
  line L13 (42.975, 9.74) -> (49.015, 9.74)
  line L14 (49.015, 9.74) -> (49.015, 14.26)
  line L15 (49.015, 14.26) -> (42.975, 14.26)
  line L16 (42.975, 14.26) -> (42.975, 21.71)
  line L17 (42.975, 21.71) -> (49.015, 21.71)
  line L18 (49.015, 21.71) -> (49.015, 31.96)
  line L19 (49.015, 31.96) -> (-49.015, 31.96)
  line L20 (-49.015, 31.96) -> (-49.015, -31.96)
  line L21 (-49.015, -31.96) -> (-38.335, -31.96)
  line L22 (-38.335, -31.96) -> (-38.335, -18.62)
  line L23 (-38.335, -18.62) -> (-23.405, -18.62)
  line L24 (-23.405, -18.62) -> (-23.405, -31.96)
  line L25 (-23.405, -31.96) -> (10.995, -31.96)
  line L26 (10.995, -31.96) -> (10.995, -25.92)
  line L27 (10.995, -25.92) -> (23.085, -25.92)
  line L28 (23.085, -25.92) -> (23.085, -31.96)
  line L29 (23.085, -31.96) -> (29.935, -31.96)
  line L30 (29.935, -31.96) -> (29.935, -26.46)
  line L31 (29.935, -26.46) -> (37.335, -26.46)
  line L32 (38.345, 11.1) -> (-38.345, 11.1)
  line L33 (-38.345, 11.1) -> (-38.345, 31.38)
  line L34 (-38.345, 31.38) -> (38.345, 31.38)
  line L35 (38.345, 31.38) -> (38.345, 11.1)
  circle A0 centre (46.105, -28.98) radius 1.58
  circle A1 centre (-46.035, 28.98) radius 1.58
  circle A2 centre (46.105, 28.98) radius 1.58
  circle A3 centre (-46.035, -28.98) radius 1.58
  line L36 (-12.205, -27.27) -> (-12.205, -19.63)
  line L37 (-12.205, -19.63) -> (0.895, -19.63)
  line L38 (0.895, -19.63) -> (0.895, -27.27)
  line L39 (0.895, -27.27) -> (-12.205, -27.27)
sketch "Sketch16" plane through (0, 0, 1.14) normal (0, 0, 1) x (1, 0, 0)
sketch "Sketch17" plane through (-49.015, 0, 0) normal (-1, 0, 0) x (0, -1, 0)
  line L0 (-31.96, 0) -> (31.96, 0)
  line L1 (31.96, 0) -> (31.96, 1.14)
  line L2 (31.96, 1.14) -> (21.71, 1.14)
  line L3 (21.71, 1.14) -> (21.71, 8.23)
  line L4 (21.71, 8.23) -> (14.26, 8.23)
  line L5 (14.26, 8.23) -> (14.26, 1.14)
  line L6 (14.26, 1.14) -> (9.74, 1.14)
  line L7 (9.74, 1.14) -> (9.74, 8.23)
  line L8 (9.74, 8.23) -> (2.29, 8.23)
  line L9 (2.29, 8.23) -> (2.29, 1.14)
  line L10 (2.29, 1.14) -> (-2.23, 1.14)
  line L11 (-2.23, 1.14) -> (-2.23, 8.23)
  line L12 (-2.23, 8.23) -> (-9.68, 8.23)
  line L13 (-9.68, 8.23) -> (-9.68, 1.14)
  line L14 (-9.68, 1.14) -> (-14.2, 1.14)
  line L15 (-14.2, 1.14) -> (-14.2, 8.23)
  line L16 (-14.2, 8.23) -> (-21.65, 8.23)
  line L17 (-21.65, 8.23) -> (-21.65, 1.14)
  line L18 (-21.65, 1.14) -> (-31.96, 1.14)
  line L19 (-31.96, 1.14) -> (-31.96, 0)
  circle A0 centre (-6, 5.08) radius 1.69
  circle A1 centre (-18, 5.08) radius 1.69
  circle A2 centre (6, 5.08) radius 1.69
  circle A3 centre (18, 5.08) radius 1.69
  line L20 (14.26, 8.23) -> (21.71, 8.23)
  dimension "d79" = 3.38
  dimension "d80" = 3.38
  dimension "d81" = 3.38
  dimension "d82" = 3.38
  dimension "d83" = 3.15
  dimension "d84" = 3.15
  dimension "d85" = 3.15
  dimension "d86" = 3.15
extrude "Extrude13" add sketch "Sketch17" along normal blind 3.7 draft -6 contours A0 | A1 | A2 | A3
